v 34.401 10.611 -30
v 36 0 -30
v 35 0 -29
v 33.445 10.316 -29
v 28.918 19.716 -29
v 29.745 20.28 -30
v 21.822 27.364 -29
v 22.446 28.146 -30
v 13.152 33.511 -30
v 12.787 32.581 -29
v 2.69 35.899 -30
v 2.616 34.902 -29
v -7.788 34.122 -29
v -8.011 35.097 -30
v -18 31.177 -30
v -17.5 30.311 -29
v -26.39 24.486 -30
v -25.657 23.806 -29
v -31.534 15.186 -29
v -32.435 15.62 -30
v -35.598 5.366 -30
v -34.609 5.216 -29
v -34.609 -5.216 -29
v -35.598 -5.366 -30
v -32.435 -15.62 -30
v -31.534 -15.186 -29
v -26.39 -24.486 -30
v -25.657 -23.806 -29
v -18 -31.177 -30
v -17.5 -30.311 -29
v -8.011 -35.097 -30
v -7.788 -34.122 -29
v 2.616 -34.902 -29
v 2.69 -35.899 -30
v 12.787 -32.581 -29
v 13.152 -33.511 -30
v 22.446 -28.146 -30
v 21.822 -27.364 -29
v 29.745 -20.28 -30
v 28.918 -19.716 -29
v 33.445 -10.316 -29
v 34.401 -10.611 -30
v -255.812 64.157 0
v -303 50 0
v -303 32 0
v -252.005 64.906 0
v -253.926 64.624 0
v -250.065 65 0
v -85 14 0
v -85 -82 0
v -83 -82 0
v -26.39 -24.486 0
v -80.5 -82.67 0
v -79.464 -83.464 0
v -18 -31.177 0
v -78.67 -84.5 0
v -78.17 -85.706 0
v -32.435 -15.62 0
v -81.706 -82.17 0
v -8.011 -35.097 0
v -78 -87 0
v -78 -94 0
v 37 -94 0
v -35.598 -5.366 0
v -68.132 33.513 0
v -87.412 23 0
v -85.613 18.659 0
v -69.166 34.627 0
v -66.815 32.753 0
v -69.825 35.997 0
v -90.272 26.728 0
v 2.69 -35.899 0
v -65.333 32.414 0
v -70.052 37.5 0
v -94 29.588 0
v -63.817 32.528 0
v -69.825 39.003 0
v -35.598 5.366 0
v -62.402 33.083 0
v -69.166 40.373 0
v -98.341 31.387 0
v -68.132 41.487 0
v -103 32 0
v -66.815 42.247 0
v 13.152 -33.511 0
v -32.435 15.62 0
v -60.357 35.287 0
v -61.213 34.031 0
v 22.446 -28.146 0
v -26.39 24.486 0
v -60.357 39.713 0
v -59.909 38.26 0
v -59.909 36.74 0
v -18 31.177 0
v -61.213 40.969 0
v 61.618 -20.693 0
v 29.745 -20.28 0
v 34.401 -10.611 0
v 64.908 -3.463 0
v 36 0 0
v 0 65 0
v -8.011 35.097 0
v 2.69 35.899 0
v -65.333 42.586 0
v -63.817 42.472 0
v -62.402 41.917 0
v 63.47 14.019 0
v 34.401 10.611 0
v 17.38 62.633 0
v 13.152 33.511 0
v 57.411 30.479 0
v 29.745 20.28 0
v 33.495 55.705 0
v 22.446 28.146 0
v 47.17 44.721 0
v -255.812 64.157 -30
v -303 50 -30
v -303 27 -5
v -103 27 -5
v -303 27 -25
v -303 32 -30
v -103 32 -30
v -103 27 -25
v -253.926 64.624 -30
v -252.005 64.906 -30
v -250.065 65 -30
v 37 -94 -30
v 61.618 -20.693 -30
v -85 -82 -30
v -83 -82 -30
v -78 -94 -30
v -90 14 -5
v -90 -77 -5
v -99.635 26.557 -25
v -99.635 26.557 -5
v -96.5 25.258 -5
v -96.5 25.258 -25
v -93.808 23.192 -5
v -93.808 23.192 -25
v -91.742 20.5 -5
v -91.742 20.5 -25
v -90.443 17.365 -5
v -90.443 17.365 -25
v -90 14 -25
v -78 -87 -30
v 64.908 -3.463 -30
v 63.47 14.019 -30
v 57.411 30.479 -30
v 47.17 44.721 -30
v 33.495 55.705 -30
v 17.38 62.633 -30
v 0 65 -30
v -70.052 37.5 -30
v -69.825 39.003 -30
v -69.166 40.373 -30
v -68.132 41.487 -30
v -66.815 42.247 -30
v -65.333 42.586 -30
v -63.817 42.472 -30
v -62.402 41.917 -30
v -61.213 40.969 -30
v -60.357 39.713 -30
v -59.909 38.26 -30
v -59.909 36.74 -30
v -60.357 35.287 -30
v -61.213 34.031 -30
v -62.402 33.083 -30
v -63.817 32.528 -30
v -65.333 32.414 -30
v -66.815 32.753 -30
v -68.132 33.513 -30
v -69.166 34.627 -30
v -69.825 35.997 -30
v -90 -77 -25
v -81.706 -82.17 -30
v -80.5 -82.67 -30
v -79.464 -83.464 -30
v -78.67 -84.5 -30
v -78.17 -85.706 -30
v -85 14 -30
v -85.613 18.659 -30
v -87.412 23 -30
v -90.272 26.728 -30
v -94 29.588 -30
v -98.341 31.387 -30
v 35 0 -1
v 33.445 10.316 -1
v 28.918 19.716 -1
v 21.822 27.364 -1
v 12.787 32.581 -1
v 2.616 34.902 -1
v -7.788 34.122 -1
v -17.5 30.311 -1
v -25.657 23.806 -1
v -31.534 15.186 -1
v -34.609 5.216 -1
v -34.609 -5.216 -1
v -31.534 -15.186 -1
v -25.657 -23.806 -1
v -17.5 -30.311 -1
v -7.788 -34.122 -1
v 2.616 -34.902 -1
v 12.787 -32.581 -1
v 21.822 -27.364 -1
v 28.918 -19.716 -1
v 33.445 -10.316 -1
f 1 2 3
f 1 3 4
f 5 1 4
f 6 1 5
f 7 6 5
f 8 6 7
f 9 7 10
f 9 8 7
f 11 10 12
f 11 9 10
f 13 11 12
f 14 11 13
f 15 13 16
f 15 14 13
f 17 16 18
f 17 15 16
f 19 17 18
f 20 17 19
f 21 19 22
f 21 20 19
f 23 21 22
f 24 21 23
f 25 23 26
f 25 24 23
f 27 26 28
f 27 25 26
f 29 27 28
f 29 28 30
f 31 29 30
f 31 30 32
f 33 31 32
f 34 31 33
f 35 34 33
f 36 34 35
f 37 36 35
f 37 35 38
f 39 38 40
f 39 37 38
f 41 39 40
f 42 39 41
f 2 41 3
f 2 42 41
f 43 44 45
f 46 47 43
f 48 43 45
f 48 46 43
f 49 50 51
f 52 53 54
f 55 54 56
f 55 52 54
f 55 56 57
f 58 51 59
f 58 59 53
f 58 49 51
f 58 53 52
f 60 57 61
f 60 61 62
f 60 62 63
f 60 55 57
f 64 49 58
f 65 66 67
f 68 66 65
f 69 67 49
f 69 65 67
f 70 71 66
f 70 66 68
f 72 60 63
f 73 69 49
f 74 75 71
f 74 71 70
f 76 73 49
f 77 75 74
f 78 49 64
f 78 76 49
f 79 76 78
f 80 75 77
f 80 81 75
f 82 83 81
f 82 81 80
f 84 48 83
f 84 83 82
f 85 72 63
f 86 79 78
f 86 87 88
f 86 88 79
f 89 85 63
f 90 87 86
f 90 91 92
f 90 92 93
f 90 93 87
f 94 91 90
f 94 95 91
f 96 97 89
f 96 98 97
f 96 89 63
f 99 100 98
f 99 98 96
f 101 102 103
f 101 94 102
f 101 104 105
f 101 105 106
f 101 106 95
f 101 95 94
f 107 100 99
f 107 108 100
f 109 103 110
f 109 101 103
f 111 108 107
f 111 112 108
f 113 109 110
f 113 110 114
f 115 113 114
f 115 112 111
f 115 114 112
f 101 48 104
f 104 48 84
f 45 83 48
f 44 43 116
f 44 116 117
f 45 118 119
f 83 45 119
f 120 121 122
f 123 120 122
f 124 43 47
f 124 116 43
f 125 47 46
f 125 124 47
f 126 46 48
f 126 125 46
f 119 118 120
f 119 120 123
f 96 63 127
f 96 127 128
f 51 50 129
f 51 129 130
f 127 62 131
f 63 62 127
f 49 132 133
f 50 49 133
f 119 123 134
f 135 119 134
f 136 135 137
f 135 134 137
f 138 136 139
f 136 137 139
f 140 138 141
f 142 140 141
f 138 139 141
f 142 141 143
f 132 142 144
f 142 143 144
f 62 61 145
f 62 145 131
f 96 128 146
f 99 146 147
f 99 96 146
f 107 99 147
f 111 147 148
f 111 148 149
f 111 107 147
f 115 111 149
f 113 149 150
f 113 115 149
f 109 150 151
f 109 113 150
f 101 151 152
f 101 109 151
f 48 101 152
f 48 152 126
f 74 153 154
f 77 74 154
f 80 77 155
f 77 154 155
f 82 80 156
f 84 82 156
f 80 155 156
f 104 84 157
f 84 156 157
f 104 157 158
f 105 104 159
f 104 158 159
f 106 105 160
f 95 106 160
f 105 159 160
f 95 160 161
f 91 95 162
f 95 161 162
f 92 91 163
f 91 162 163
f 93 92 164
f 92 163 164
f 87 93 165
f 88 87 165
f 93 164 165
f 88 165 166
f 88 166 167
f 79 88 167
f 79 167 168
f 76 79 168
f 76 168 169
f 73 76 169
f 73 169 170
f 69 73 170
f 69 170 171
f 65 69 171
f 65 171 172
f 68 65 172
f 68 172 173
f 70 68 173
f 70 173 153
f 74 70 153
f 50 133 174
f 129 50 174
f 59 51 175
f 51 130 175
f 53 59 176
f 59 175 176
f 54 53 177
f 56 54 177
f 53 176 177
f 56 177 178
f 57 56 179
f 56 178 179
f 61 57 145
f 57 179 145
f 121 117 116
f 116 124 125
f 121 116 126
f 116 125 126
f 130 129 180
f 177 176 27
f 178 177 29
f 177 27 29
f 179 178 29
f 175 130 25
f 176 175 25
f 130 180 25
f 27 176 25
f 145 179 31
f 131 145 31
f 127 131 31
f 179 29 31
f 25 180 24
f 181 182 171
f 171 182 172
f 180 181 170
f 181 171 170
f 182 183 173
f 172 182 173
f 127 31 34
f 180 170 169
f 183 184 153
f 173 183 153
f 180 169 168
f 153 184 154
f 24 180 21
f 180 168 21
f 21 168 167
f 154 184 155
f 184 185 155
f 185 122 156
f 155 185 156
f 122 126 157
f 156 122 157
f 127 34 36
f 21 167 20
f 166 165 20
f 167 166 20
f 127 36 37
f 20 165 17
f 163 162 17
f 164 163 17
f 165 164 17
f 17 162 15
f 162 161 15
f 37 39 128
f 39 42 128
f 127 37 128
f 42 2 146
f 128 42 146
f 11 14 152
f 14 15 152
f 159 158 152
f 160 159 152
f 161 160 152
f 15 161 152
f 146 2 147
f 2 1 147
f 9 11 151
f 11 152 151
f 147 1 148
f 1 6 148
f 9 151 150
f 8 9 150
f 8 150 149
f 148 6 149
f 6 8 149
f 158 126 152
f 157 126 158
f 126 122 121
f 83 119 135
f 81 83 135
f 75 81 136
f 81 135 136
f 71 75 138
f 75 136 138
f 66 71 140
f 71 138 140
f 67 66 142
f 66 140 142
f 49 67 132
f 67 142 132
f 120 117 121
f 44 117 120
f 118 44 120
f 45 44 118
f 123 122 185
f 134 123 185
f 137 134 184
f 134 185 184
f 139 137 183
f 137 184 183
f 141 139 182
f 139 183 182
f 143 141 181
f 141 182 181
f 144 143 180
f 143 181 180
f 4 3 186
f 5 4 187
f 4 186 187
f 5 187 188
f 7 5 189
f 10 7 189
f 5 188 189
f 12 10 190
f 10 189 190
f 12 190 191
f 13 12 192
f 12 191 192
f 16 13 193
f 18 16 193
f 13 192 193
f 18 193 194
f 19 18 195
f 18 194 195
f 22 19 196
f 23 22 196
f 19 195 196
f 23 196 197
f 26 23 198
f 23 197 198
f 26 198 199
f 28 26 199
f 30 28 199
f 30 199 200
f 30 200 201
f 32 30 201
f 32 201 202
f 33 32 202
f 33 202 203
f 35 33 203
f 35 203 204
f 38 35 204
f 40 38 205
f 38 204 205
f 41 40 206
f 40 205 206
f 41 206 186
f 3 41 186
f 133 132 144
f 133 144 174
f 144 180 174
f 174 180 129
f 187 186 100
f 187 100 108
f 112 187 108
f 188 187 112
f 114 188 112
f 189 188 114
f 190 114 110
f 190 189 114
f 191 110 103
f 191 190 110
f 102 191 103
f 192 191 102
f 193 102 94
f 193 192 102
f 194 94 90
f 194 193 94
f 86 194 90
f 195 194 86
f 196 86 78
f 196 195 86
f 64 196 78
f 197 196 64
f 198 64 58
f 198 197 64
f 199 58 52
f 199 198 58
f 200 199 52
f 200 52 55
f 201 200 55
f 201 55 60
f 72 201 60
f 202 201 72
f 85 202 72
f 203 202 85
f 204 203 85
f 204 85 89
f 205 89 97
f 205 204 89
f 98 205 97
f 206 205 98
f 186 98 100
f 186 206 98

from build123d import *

# Parameters (mm, degrees)
SKETCH_1_R             = 35
SM_BASE_FLANGE_1_DEPTH = 30
FILLET_1_R             = 20
FILLET_2_R             = 13
FILLET_3_R             = 5
HOLE_WIZARD_M12_1_D    = 10.2
CHAMFER_1_SIZE         = 5
CHAMFER_2_SIZE         = 1


# Sheet-metal steps are written as plain solids
with BuildPart() as part:
    # Sketch 1 → 基体-法兰1 (new body)
    with BuildSketch(Plane.XY):
        with BuildLine():
            Line((-303, 50), (-303, 27))
            Line((-303, 27), (-90, 27))
            Line((-90, 27), (-90, -82))
            Line((-90, -82), (-78, -82))
            Line((-78, -82), (-78, -94))
            Line((-78, -94), (37, -94))
            Line((37, -94), (61.618237028, -20.692821595))
            ThreePointArc((61.618237028, -20.692821595), (52.77325745, 37.947111855), (0, 65))
            Line((0, 65), (-253, 65))
            Line((-253, 65), (-303, 50))
        make_face()
        Circle(SKETCH_1_R, mode=Mode.SUBTRACT)
    extrude(amount=-SM_BASE_FLANGE_1_DEPTH)

    # 圆角1
    fillet_1_edges = [part.edges().sort_by_distance(p)[0] for p in [
        (-253, 65, -15),
    ]]
    fillet(fillet_1_edges, radius=FILLET_1_R)

    # 圆角2
    fillet_2_edges = [part.edges().sort_by_distance(p)[0] for p in [
        (-90, 27, -15),
    ]]
    fillet(fillet_2_edges, radius=FILLET_2_R)

    # 圆角3
    fillet_3_edges = [part.edges().sort_by_distance(p)[0] for p in [
        (-78, -82, -15),
    ]]
    fillet(fillet_3_edges, radius=FILLET_3_R)

    # M12 螺纹孔1 (through all)
    with Locations(Plane.XY):
        with Locations((-64.951905284, 37.5)):
            Hole(HOLE_WIZARD_M12_1_D / 2)

    # 倒角1
    chamfer_1_edges = [part.edges().sort_by_distance(p)[0] for p in [
        (-203, 27, 0),
        (-90, -82, -15),
        (-203, 27, -30),
        (-90, -34, 0),
        (-90, -34, -30),
        (-93.807611845, 23.192388155, 0),
        (-93.807611845, 23.192388155, -30),
    ]]
    chamfer(chamfer_1_edges, length=CHAMFER_1_SIZE)

    # 倒角2
    chamfer_2_edges = [part.edges().sort_by_distance(p)[0] for p in [
        (-35, 0, -30),
        (-35, 0, 0),
    ]]
    chamfer(chamfer_2_edges, length=CHAMFER_2_SIZE)


solid = part.part
